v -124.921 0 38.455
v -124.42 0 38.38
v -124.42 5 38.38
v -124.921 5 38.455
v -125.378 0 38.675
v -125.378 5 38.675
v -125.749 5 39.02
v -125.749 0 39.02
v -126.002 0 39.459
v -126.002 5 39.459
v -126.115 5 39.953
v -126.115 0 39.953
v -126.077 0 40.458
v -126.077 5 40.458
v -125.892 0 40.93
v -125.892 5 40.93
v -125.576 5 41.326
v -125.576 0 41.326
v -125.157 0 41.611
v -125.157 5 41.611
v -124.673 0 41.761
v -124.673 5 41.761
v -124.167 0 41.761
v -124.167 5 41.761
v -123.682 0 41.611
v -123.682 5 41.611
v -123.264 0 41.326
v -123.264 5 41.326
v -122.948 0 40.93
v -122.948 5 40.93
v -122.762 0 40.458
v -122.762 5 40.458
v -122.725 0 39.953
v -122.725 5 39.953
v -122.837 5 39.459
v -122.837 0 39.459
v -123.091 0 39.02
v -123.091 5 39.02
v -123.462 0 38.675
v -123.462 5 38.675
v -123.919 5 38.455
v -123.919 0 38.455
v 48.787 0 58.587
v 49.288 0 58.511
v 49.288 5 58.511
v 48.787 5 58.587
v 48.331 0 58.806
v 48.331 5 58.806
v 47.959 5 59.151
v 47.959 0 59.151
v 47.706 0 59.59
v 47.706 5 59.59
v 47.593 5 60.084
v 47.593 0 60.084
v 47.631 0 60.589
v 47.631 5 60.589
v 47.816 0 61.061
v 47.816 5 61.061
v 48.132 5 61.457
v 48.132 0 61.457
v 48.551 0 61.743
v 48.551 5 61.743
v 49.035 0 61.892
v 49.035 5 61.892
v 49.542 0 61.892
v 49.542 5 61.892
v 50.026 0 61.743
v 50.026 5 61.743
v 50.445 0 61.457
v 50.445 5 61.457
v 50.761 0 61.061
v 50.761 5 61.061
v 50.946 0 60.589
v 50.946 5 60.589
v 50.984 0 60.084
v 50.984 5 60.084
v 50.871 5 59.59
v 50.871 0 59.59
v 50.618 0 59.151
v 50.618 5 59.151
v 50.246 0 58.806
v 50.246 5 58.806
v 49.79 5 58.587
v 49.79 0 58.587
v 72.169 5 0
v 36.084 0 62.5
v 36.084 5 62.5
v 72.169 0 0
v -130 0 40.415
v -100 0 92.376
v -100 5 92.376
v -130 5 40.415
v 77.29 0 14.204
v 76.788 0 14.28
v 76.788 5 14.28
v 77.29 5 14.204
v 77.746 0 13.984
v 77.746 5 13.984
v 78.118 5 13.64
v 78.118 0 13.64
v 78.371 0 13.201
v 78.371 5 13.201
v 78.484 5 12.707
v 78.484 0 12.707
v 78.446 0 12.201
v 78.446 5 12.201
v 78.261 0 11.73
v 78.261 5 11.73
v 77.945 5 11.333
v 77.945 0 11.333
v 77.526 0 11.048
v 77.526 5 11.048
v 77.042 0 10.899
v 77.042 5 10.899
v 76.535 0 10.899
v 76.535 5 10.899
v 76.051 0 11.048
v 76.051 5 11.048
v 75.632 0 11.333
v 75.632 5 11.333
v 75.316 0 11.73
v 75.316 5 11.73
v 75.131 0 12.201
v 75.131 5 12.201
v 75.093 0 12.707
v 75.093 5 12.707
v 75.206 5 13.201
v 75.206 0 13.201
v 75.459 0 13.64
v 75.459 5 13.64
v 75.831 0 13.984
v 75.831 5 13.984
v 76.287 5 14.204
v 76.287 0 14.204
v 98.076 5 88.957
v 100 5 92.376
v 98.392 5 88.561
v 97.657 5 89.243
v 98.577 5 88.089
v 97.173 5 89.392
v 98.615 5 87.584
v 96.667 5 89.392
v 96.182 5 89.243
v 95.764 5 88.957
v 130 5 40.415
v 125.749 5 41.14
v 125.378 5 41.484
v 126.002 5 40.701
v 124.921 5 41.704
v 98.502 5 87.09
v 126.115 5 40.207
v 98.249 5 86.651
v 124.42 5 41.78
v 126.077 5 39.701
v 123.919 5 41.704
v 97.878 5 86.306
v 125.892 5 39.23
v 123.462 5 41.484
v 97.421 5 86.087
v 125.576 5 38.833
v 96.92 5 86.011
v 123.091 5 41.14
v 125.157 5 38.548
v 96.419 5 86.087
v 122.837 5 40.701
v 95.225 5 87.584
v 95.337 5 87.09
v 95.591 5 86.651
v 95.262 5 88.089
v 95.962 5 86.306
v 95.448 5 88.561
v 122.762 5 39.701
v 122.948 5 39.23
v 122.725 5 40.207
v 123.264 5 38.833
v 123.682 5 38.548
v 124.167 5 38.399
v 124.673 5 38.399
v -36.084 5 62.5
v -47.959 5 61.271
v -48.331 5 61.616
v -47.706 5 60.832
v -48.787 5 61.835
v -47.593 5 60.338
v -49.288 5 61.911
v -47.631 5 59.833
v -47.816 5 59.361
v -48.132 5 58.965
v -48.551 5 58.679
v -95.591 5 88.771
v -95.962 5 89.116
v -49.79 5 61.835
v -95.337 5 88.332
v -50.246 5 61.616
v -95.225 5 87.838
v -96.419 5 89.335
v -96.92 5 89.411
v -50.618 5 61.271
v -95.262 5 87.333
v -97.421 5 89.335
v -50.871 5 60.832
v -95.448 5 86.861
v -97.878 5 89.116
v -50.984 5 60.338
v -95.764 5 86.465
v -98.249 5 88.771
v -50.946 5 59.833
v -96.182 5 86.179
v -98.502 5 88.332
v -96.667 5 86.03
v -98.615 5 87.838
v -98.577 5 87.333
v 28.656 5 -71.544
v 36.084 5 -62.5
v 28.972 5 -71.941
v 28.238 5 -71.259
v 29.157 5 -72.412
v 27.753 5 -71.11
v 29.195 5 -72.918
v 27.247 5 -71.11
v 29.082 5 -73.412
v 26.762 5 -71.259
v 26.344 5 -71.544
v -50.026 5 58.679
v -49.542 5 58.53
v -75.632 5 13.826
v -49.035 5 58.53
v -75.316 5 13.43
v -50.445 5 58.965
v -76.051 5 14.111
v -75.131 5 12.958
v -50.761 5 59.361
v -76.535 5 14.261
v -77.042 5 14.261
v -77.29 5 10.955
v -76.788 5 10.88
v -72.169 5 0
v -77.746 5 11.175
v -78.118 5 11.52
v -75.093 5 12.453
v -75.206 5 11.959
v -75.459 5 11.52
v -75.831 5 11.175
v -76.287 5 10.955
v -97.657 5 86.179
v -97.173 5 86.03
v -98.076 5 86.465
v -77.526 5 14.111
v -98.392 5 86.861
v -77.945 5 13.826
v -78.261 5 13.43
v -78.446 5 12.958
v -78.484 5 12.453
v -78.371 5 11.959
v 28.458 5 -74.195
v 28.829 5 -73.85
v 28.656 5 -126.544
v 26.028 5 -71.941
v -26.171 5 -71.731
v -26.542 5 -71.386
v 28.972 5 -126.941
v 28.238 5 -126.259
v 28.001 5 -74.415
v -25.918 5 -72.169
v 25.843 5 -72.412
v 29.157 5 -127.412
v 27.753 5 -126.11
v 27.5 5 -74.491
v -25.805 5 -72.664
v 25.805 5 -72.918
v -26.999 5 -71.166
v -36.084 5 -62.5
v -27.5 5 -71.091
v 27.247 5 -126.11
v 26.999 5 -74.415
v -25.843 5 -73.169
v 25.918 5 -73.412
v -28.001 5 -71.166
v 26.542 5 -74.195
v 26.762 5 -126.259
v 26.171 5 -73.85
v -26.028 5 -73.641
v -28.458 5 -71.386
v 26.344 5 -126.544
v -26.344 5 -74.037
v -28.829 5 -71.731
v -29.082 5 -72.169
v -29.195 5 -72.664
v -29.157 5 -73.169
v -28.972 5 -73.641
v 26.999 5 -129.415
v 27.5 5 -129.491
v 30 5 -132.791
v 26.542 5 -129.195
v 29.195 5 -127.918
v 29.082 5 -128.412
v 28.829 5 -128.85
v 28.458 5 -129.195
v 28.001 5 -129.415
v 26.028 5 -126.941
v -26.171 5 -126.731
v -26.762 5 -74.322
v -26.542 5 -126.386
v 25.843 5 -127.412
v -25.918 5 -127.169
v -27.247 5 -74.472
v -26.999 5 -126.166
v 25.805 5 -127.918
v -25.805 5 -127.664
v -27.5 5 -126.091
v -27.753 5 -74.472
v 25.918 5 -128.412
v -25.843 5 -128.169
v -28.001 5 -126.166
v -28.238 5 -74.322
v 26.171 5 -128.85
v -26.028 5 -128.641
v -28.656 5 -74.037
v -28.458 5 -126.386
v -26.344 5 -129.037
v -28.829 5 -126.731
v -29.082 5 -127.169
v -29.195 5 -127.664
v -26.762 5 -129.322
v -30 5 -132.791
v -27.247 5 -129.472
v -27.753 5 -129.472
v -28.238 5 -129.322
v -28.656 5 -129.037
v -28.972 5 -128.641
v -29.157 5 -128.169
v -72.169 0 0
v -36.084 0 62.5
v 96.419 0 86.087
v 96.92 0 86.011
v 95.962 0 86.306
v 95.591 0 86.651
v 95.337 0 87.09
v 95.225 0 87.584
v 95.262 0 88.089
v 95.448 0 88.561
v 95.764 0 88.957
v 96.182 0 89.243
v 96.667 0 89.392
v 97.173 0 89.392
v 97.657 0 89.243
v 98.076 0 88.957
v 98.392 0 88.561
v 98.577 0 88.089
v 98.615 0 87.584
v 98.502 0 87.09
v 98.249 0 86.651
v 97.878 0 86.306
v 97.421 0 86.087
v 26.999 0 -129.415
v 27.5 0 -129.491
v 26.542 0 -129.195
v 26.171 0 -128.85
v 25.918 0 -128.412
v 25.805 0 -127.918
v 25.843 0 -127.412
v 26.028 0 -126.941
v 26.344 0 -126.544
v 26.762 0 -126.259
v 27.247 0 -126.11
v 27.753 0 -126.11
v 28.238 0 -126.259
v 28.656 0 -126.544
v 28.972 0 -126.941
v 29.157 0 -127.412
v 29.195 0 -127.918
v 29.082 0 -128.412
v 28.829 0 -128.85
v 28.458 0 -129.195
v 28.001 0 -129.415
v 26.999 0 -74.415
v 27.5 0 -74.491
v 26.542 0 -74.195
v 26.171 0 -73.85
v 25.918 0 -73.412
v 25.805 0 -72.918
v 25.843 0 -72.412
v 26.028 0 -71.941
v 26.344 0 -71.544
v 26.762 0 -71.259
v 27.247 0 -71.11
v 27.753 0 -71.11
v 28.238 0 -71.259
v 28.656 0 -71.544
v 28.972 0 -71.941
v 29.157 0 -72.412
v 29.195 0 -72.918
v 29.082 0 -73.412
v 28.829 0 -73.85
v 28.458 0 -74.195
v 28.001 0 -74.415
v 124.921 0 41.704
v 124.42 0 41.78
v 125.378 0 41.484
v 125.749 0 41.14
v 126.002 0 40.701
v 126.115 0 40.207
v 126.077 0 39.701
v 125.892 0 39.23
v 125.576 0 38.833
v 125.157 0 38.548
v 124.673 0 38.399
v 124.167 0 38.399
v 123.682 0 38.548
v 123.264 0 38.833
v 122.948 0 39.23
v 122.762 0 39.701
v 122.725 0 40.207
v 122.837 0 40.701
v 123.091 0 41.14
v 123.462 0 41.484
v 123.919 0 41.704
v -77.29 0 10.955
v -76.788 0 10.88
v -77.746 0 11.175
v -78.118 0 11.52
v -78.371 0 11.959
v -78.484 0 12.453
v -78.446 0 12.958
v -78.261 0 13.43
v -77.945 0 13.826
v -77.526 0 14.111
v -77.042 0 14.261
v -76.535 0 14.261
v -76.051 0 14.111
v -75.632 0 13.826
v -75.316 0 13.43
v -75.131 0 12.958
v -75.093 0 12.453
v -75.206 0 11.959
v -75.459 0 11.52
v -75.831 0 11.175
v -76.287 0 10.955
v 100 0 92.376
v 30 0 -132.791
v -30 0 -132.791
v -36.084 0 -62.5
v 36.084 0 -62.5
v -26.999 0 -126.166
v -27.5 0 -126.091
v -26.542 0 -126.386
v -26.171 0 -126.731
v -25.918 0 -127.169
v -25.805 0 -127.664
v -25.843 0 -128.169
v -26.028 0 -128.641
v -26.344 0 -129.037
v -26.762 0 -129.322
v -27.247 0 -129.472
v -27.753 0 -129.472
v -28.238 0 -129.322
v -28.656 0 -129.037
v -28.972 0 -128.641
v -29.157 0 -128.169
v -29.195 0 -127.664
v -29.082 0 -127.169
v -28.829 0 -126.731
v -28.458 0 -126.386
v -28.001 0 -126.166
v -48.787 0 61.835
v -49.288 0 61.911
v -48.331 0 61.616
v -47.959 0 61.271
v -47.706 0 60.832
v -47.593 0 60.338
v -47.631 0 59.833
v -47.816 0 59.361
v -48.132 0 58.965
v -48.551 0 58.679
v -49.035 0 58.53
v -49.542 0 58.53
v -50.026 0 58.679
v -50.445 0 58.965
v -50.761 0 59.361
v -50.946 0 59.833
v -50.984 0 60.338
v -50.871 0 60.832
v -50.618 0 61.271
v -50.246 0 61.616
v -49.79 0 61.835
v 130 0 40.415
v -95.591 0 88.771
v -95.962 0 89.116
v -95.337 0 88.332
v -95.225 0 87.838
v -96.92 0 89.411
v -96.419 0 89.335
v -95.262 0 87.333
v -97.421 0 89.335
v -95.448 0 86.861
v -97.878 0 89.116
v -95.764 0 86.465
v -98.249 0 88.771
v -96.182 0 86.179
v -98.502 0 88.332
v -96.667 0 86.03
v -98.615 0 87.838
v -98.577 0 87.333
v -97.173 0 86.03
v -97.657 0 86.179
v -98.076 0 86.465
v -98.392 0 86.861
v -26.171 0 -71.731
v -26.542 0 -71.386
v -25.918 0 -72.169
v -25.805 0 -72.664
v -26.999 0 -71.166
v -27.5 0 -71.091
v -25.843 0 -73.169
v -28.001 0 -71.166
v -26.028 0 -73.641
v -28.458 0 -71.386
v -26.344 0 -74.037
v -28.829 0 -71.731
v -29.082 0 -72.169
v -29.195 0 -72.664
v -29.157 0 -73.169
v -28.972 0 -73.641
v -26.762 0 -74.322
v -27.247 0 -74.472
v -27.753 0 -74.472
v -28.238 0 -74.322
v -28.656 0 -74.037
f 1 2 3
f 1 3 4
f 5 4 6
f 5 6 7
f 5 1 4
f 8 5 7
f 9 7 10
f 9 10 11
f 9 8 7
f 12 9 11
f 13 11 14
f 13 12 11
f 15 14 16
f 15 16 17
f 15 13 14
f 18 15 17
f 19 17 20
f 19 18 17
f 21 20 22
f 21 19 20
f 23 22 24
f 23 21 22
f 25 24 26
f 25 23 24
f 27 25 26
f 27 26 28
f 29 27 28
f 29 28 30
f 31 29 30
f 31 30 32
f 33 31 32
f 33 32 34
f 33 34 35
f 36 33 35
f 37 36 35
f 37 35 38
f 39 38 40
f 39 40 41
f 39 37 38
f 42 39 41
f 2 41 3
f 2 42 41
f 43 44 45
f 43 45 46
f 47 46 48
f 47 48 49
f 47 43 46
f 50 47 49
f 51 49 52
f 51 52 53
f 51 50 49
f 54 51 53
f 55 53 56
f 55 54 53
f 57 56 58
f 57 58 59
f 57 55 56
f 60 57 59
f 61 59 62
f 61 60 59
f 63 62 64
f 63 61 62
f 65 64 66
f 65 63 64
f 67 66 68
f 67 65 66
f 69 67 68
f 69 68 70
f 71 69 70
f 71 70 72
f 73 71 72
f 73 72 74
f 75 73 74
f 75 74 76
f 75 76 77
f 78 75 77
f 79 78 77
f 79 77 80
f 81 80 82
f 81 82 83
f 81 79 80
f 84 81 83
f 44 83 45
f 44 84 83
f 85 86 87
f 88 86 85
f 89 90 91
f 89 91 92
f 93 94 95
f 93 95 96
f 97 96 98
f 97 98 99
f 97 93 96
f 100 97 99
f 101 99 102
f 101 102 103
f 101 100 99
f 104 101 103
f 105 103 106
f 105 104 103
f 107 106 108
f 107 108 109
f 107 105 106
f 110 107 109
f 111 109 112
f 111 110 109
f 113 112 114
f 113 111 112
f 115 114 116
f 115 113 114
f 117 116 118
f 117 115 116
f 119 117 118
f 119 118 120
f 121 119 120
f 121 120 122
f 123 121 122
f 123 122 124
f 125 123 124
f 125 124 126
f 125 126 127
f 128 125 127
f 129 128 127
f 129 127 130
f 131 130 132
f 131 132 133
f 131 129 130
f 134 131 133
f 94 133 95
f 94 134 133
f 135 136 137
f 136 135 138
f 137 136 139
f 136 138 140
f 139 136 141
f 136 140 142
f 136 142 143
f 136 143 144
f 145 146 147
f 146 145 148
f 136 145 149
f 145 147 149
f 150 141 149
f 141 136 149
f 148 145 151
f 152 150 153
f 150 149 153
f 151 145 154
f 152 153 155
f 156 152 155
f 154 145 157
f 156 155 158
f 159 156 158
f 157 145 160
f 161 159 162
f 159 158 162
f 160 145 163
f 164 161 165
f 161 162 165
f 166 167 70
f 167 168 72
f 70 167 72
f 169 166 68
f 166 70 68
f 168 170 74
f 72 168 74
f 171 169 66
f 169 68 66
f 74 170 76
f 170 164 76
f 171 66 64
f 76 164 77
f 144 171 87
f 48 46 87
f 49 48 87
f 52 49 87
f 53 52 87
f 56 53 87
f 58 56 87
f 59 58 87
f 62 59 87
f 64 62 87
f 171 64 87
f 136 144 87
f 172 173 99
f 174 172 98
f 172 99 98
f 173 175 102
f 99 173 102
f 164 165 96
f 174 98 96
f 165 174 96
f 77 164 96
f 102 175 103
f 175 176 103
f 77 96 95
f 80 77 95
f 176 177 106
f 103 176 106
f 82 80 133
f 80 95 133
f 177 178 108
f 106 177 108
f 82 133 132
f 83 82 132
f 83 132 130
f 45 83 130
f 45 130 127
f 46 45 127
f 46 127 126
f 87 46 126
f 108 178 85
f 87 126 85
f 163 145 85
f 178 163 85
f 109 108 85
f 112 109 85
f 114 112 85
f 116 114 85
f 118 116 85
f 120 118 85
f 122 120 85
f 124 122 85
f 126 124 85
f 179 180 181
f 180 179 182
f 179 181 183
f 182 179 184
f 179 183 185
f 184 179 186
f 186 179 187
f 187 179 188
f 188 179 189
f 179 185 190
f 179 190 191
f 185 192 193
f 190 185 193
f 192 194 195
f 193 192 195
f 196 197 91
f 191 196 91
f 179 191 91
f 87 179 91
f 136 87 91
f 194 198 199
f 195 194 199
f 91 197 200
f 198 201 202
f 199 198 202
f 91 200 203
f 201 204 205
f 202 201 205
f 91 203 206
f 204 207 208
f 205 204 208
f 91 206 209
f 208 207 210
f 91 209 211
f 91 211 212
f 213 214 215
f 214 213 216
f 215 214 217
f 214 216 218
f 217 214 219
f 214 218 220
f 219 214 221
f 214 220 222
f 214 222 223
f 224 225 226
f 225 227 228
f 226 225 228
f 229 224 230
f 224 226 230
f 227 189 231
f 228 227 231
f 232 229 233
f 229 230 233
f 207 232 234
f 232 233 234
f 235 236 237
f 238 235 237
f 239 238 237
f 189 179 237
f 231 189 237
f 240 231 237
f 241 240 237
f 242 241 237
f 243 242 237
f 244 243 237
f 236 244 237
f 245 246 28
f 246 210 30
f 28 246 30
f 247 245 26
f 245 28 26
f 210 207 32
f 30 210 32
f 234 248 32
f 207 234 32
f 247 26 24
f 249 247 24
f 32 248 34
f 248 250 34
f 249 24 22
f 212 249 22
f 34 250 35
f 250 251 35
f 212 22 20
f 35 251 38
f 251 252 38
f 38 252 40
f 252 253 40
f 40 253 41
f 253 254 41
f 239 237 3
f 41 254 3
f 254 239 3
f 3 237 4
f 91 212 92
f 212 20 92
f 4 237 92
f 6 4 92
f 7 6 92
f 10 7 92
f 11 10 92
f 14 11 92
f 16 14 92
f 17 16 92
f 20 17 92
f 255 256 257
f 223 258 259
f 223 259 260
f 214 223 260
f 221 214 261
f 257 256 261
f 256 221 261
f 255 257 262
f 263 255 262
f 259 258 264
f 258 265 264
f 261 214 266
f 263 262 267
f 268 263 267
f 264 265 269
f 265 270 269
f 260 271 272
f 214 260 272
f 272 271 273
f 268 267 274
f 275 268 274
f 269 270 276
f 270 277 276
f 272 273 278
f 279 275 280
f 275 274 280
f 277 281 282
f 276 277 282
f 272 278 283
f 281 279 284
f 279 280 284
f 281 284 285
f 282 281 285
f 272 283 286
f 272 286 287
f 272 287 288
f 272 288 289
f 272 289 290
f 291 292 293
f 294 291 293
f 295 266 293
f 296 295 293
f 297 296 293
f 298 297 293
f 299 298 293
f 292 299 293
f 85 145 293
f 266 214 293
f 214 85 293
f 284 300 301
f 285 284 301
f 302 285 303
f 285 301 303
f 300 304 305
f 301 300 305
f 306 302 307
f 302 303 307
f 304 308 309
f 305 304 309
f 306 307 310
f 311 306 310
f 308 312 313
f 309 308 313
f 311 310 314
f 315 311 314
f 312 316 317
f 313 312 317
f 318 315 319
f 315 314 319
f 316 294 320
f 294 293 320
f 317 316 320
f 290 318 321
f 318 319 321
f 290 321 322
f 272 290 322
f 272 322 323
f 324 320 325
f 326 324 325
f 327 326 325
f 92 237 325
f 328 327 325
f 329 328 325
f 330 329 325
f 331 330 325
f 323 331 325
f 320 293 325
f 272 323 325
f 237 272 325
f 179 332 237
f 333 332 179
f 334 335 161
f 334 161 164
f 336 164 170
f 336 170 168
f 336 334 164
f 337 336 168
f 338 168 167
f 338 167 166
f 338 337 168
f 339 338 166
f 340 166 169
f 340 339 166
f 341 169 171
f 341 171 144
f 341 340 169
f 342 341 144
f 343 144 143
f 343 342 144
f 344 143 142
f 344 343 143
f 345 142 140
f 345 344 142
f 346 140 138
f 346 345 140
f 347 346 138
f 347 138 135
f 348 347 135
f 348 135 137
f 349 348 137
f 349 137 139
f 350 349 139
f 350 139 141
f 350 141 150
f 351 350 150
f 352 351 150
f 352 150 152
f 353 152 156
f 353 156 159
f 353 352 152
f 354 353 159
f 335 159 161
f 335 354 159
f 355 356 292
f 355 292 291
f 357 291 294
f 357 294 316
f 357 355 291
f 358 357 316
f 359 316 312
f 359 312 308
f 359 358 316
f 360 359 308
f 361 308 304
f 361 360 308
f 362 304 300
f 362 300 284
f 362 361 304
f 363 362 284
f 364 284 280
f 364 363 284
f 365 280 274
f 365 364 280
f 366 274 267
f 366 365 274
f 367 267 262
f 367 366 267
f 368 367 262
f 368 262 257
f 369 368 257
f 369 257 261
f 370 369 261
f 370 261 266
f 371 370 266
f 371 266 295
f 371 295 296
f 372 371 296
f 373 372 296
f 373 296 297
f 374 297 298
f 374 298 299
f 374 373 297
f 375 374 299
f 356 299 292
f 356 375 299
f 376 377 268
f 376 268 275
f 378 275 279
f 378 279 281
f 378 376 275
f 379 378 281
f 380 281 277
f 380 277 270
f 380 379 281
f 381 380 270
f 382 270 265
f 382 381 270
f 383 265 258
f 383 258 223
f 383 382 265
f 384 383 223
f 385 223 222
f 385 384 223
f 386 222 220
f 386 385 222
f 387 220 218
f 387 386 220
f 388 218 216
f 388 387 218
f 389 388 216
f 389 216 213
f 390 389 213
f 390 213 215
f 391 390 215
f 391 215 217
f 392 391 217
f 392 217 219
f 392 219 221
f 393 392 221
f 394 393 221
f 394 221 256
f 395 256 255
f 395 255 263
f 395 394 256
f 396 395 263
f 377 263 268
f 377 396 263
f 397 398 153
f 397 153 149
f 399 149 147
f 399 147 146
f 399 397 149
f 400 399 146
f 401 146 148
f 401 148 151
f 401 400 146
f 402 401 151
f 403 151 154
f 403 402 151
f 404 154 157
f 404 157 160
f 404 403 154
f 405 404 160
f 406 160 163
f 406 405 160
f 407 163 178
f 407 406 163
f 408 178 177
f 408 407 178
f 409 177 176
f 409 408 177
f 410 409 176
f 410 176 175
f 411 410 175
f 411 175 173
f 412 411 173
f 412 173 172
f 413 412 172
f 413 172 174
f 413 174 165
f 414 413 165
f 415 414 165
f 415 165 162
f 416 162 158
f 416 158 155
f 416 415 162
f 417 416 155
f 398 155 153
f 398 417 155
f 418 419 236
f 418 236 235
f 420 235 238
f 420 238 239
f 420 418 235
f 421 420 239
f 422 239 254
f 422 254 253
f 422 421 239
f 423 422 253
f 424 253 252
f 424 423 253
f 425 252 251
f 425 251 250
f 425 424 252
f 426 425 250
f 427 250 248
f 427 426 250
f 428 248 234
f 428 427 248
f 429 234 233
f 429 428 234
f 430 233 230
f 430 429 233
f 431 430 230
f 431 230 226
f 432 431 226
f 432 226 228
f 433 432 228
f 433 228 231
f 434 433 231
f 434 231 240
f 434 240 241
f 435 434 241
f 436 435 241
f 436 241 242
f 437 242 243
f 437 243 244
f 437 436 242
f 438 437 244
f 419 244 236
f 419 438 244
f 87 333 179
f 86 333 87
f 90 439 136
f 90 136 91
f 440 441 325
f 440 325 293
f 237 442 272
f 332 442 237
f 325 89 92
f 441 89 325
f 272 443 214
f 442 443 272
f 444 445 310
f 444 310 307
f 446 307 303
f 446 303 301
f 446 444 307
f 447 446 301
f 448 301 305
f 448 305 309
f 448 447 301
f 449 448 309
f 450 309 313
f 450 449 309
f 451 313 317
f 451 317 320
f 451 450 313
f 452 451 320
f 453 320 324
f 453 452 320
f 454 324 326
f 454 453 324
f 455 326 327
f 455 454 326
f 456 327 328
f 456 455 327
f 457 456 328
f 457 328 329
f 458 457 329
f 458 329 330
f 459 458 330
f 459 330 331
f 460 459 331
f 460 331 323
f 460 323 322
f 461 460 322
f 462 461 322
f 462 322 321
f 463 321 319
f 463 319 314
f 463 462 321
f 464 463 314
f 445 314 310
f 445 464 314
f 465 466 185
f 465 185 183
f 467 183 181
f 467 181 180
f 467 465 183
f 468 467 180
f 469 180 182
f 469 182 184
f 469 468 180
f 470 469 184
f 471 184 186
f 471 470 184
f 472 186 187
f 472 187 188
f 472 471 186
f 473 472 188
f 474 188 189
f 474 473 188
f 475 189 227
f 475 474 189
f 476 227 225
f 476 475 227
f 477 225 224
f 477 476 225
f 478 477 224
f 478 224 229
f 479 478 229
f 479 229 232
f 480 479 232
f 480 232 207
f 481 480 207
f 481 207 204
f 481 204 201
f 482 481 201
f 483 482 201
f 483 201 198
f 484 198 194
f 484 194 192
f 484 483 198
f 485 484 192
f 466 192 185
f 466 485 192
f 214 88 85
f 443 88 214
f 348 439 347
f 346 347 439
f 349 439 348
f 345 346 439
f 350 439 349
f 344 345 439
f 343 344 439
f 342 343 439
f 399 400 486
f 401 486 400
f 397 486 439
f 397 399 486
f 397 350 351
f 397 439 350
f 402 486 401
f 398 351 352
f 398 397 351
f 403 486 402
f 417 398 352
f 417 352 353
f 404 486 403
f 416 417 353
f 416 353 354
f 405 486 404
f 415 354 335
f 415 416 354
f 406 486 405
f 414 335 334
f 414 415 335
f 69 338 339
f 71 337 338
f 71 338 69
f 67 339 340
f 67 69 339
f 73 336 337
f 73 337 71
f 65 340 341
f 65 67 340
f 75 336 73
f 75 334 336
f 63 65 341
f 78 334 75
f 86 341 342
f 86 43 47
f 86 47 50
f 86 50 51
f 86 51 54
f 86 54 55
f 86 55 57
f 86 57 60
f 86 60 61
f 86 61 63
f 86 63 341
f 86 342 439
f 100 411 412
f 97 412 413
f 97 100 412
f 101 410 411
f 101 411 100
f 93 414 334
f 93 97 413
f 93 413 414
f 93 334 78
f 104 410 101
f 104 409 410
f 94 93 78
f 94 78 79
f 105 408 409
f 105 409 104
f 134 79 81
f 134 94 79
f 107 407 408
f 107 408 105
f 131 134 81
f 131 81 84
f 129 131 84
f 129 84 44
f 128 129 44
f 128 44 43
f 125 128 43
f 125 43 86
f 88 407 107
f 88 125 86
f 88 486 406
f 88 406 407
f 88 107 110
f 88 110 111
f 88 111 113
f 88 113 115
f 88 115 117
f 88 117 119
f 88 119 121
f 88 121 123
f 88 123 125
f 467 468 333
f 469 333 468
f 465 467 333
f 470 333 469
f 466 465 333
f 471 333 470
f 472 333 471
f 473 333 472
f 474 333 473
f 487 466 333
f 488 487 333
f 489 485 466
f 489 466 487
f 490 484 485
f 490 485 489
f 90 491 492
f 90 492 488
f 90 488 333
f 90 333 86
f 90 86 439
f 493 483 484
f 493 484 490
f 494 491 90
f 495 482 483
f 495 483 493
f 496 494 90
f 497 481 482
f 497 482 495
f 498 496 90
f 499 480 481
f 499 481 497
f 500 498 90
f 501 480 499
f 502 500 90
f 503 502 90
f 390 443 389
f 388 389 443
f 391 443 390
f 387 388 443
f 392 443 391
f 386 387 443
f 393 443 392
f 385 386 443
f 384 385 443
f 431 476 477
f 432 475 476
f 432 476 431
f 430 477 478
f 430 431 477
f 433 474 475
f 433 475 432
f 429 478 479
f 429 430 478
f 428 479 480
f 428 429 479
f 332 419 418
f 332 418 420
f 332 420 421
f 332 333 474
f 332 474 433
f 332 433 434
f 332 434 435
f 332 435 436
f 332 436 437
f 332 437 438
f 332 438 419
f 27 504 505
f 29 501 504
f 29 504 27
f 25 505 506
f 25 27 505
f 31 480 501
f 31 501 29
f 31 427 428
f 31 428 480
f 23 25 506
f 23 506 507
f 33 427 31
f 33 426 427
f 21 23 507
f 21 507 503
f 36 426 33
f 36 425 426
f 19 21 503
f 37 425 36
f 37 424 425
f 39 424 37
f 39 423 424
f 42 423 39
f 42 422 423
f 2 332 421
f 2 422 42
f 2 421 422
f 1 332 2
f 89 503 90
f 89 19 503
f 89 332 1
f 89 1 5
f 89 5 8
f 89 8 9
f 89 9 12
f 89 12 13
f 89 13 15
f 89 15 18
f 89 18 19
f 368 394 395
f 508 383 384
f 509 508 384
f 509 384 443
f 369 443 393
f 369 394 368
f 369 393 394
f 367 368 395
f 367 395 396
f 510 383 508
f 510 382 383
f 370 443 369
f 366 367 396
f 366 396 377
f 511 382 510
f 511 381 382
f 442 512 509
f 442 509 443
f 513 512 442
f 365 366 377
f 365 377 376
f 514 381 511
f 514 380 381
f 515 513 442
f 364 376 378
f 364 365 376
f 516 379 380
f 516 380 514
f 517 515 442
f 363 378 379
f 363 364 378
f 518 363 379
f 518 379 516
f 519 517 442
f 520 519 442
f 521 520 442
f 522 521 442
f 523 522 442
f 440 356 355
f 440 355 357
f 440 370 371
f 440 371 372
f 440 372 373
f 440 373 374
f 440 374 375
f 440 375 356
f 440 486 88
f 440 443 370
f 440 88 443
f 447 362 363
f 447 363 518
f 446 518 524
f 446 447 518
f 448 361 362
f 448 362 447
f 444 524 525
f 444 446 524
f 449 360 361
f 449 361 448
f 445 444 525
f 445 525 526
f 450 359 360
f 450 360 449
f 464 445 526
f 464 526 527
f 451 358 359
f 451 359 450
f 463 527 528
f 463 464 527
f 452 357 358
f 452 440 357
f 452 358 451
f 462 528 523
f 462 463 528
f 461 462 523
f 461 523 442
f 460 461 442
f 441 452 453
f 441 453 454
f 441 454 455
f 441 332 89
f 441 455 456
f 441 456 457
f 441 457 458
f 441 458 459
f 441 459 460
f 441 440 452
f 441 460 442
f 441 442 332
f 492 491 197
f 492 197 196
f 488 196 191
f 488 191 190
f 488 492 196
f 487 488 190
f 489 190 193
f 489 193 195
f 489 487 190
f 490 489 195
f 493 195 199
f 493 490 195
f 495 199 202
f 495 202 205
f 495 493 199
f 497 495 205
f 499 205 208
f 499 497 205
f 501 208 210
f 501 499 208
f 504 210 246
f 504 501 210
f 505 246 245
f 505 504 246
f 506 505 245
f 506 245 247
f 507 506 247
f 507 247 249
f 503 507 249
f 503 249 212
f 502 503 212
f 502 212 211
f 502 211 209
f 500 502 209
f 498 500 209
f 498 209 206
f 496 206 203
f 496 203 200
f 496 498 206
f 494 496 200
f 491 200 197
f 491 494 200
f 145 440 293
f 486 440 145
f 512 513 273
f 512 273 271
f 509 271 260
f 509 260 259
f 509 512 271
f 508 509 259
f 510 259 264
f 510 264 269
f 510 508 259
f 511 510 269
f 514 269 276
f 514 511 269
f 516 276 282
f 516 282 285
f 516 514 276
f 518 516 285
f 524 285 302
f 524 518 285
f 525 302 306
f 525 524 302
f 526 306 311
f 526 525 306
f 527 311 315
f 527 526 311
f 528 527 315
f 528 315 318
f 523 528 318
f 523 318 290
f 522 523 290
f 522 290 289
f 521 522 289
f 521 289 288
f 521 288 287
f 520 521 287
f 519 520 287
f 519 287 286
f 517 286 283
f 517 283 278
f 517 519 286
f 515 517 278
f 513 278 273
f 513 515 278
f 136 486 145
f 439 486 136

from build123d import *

# Parameters (mm, degrees)
SKETCH1_R           = 1.7
BOSS_EXTRUDE1_DEPTH = 5


with BuildPart() as part:
    # Sketch1 → Boss-Extrude1 (new body)
    with BuildSketch(Plane(origin=(0, 0, 0), x_dir=(1, 0, 0), z_dir=(0, 1, 0))):
        Polygon((-30, 132.790561914), (30, 132.790561914), (130, -40.414518843), (100, -92.37604307), (-100, -92.37604307), (-130, -40.414518843), align=None)
        with Locations(Location((-27.5, 127.790561914, 0), (0, 0, 270))):
            Circle(SKETCH1_R, mode=Mode.SUBTRACT)
        with Locations(Location((-27.5, 72.790561914, 0), (0, 0, 270))):
            Circle(SKETCH1_R, mode=Mode.SUBTRACT)
        with Locations(Location((27.5, 127.790561914, 0), (0, 0, 90))):
            Circle(SKETCH1_R, mode=Mode.SUBTRACT)
        with Locations(Location((27.5, 72.790561914, 0), (0, 0, 90))):
            Circle(SKETCH1_R, mode=Mode.SUBTRACT)
        with Locations(Location((76.788475773, -12.579582353, 0), (0, 0, 270))):
            Circle(SKETCH1_R, mode=Mode.SUBTRACT)
        with Locations(Location((49.288475773, -60.210979561, 0), (0, 0, 90))):
            Circle(SKETCH1_R, mode=Mode.SUBTRACT)
        with Locations(Location((96.919872981, -87.710979561, 0), (0, 0, 90))):
            Circle(SKETCH1_R, mode=Mode.SUBTRACT)
        with Locations(Location((124.419872981, -40.079582353, 0), (0, 0, 270))):
            Circle(SKETCH1_R, mode=Mode.SUBTRACT)
        with Locations(Location((-49.288475773, -60.210979561, 0), (0, 0, 270))):
            Circle(SKETCH1_R, mode=Mode.SUBTRACT)
        with Locations(Location((-76.788475773, -12.579582353, 0), (0, 0, 90))):
            Circle(SKETCH1_R, mode=Mode.SUBTRACT)
        with Locations(Location((-124.419872981, -40.079582353, 0), (0, 0, 90))):
            Circle(SKETCH1_R, mode=Mode.SUBTRACT)
        with Locations(Location((-96.919872981, -87.710979561, 0), (0, 0, 270))):
            Circle(SKETCH1_R, mode=Mode.SUBTRACT)
        Polygon((-72.168783649, 0), (-36.084391824, -62.5), (36.084391824, -62.5), (72.168783649, 0), (36.084391824, 62.5), (-36.084391824, 62.5), align=None, mode=Mode.SUBTRACT)
    extrude(amount=BOSS_EXTRUDE1_DEPTH)


solid = part.part
